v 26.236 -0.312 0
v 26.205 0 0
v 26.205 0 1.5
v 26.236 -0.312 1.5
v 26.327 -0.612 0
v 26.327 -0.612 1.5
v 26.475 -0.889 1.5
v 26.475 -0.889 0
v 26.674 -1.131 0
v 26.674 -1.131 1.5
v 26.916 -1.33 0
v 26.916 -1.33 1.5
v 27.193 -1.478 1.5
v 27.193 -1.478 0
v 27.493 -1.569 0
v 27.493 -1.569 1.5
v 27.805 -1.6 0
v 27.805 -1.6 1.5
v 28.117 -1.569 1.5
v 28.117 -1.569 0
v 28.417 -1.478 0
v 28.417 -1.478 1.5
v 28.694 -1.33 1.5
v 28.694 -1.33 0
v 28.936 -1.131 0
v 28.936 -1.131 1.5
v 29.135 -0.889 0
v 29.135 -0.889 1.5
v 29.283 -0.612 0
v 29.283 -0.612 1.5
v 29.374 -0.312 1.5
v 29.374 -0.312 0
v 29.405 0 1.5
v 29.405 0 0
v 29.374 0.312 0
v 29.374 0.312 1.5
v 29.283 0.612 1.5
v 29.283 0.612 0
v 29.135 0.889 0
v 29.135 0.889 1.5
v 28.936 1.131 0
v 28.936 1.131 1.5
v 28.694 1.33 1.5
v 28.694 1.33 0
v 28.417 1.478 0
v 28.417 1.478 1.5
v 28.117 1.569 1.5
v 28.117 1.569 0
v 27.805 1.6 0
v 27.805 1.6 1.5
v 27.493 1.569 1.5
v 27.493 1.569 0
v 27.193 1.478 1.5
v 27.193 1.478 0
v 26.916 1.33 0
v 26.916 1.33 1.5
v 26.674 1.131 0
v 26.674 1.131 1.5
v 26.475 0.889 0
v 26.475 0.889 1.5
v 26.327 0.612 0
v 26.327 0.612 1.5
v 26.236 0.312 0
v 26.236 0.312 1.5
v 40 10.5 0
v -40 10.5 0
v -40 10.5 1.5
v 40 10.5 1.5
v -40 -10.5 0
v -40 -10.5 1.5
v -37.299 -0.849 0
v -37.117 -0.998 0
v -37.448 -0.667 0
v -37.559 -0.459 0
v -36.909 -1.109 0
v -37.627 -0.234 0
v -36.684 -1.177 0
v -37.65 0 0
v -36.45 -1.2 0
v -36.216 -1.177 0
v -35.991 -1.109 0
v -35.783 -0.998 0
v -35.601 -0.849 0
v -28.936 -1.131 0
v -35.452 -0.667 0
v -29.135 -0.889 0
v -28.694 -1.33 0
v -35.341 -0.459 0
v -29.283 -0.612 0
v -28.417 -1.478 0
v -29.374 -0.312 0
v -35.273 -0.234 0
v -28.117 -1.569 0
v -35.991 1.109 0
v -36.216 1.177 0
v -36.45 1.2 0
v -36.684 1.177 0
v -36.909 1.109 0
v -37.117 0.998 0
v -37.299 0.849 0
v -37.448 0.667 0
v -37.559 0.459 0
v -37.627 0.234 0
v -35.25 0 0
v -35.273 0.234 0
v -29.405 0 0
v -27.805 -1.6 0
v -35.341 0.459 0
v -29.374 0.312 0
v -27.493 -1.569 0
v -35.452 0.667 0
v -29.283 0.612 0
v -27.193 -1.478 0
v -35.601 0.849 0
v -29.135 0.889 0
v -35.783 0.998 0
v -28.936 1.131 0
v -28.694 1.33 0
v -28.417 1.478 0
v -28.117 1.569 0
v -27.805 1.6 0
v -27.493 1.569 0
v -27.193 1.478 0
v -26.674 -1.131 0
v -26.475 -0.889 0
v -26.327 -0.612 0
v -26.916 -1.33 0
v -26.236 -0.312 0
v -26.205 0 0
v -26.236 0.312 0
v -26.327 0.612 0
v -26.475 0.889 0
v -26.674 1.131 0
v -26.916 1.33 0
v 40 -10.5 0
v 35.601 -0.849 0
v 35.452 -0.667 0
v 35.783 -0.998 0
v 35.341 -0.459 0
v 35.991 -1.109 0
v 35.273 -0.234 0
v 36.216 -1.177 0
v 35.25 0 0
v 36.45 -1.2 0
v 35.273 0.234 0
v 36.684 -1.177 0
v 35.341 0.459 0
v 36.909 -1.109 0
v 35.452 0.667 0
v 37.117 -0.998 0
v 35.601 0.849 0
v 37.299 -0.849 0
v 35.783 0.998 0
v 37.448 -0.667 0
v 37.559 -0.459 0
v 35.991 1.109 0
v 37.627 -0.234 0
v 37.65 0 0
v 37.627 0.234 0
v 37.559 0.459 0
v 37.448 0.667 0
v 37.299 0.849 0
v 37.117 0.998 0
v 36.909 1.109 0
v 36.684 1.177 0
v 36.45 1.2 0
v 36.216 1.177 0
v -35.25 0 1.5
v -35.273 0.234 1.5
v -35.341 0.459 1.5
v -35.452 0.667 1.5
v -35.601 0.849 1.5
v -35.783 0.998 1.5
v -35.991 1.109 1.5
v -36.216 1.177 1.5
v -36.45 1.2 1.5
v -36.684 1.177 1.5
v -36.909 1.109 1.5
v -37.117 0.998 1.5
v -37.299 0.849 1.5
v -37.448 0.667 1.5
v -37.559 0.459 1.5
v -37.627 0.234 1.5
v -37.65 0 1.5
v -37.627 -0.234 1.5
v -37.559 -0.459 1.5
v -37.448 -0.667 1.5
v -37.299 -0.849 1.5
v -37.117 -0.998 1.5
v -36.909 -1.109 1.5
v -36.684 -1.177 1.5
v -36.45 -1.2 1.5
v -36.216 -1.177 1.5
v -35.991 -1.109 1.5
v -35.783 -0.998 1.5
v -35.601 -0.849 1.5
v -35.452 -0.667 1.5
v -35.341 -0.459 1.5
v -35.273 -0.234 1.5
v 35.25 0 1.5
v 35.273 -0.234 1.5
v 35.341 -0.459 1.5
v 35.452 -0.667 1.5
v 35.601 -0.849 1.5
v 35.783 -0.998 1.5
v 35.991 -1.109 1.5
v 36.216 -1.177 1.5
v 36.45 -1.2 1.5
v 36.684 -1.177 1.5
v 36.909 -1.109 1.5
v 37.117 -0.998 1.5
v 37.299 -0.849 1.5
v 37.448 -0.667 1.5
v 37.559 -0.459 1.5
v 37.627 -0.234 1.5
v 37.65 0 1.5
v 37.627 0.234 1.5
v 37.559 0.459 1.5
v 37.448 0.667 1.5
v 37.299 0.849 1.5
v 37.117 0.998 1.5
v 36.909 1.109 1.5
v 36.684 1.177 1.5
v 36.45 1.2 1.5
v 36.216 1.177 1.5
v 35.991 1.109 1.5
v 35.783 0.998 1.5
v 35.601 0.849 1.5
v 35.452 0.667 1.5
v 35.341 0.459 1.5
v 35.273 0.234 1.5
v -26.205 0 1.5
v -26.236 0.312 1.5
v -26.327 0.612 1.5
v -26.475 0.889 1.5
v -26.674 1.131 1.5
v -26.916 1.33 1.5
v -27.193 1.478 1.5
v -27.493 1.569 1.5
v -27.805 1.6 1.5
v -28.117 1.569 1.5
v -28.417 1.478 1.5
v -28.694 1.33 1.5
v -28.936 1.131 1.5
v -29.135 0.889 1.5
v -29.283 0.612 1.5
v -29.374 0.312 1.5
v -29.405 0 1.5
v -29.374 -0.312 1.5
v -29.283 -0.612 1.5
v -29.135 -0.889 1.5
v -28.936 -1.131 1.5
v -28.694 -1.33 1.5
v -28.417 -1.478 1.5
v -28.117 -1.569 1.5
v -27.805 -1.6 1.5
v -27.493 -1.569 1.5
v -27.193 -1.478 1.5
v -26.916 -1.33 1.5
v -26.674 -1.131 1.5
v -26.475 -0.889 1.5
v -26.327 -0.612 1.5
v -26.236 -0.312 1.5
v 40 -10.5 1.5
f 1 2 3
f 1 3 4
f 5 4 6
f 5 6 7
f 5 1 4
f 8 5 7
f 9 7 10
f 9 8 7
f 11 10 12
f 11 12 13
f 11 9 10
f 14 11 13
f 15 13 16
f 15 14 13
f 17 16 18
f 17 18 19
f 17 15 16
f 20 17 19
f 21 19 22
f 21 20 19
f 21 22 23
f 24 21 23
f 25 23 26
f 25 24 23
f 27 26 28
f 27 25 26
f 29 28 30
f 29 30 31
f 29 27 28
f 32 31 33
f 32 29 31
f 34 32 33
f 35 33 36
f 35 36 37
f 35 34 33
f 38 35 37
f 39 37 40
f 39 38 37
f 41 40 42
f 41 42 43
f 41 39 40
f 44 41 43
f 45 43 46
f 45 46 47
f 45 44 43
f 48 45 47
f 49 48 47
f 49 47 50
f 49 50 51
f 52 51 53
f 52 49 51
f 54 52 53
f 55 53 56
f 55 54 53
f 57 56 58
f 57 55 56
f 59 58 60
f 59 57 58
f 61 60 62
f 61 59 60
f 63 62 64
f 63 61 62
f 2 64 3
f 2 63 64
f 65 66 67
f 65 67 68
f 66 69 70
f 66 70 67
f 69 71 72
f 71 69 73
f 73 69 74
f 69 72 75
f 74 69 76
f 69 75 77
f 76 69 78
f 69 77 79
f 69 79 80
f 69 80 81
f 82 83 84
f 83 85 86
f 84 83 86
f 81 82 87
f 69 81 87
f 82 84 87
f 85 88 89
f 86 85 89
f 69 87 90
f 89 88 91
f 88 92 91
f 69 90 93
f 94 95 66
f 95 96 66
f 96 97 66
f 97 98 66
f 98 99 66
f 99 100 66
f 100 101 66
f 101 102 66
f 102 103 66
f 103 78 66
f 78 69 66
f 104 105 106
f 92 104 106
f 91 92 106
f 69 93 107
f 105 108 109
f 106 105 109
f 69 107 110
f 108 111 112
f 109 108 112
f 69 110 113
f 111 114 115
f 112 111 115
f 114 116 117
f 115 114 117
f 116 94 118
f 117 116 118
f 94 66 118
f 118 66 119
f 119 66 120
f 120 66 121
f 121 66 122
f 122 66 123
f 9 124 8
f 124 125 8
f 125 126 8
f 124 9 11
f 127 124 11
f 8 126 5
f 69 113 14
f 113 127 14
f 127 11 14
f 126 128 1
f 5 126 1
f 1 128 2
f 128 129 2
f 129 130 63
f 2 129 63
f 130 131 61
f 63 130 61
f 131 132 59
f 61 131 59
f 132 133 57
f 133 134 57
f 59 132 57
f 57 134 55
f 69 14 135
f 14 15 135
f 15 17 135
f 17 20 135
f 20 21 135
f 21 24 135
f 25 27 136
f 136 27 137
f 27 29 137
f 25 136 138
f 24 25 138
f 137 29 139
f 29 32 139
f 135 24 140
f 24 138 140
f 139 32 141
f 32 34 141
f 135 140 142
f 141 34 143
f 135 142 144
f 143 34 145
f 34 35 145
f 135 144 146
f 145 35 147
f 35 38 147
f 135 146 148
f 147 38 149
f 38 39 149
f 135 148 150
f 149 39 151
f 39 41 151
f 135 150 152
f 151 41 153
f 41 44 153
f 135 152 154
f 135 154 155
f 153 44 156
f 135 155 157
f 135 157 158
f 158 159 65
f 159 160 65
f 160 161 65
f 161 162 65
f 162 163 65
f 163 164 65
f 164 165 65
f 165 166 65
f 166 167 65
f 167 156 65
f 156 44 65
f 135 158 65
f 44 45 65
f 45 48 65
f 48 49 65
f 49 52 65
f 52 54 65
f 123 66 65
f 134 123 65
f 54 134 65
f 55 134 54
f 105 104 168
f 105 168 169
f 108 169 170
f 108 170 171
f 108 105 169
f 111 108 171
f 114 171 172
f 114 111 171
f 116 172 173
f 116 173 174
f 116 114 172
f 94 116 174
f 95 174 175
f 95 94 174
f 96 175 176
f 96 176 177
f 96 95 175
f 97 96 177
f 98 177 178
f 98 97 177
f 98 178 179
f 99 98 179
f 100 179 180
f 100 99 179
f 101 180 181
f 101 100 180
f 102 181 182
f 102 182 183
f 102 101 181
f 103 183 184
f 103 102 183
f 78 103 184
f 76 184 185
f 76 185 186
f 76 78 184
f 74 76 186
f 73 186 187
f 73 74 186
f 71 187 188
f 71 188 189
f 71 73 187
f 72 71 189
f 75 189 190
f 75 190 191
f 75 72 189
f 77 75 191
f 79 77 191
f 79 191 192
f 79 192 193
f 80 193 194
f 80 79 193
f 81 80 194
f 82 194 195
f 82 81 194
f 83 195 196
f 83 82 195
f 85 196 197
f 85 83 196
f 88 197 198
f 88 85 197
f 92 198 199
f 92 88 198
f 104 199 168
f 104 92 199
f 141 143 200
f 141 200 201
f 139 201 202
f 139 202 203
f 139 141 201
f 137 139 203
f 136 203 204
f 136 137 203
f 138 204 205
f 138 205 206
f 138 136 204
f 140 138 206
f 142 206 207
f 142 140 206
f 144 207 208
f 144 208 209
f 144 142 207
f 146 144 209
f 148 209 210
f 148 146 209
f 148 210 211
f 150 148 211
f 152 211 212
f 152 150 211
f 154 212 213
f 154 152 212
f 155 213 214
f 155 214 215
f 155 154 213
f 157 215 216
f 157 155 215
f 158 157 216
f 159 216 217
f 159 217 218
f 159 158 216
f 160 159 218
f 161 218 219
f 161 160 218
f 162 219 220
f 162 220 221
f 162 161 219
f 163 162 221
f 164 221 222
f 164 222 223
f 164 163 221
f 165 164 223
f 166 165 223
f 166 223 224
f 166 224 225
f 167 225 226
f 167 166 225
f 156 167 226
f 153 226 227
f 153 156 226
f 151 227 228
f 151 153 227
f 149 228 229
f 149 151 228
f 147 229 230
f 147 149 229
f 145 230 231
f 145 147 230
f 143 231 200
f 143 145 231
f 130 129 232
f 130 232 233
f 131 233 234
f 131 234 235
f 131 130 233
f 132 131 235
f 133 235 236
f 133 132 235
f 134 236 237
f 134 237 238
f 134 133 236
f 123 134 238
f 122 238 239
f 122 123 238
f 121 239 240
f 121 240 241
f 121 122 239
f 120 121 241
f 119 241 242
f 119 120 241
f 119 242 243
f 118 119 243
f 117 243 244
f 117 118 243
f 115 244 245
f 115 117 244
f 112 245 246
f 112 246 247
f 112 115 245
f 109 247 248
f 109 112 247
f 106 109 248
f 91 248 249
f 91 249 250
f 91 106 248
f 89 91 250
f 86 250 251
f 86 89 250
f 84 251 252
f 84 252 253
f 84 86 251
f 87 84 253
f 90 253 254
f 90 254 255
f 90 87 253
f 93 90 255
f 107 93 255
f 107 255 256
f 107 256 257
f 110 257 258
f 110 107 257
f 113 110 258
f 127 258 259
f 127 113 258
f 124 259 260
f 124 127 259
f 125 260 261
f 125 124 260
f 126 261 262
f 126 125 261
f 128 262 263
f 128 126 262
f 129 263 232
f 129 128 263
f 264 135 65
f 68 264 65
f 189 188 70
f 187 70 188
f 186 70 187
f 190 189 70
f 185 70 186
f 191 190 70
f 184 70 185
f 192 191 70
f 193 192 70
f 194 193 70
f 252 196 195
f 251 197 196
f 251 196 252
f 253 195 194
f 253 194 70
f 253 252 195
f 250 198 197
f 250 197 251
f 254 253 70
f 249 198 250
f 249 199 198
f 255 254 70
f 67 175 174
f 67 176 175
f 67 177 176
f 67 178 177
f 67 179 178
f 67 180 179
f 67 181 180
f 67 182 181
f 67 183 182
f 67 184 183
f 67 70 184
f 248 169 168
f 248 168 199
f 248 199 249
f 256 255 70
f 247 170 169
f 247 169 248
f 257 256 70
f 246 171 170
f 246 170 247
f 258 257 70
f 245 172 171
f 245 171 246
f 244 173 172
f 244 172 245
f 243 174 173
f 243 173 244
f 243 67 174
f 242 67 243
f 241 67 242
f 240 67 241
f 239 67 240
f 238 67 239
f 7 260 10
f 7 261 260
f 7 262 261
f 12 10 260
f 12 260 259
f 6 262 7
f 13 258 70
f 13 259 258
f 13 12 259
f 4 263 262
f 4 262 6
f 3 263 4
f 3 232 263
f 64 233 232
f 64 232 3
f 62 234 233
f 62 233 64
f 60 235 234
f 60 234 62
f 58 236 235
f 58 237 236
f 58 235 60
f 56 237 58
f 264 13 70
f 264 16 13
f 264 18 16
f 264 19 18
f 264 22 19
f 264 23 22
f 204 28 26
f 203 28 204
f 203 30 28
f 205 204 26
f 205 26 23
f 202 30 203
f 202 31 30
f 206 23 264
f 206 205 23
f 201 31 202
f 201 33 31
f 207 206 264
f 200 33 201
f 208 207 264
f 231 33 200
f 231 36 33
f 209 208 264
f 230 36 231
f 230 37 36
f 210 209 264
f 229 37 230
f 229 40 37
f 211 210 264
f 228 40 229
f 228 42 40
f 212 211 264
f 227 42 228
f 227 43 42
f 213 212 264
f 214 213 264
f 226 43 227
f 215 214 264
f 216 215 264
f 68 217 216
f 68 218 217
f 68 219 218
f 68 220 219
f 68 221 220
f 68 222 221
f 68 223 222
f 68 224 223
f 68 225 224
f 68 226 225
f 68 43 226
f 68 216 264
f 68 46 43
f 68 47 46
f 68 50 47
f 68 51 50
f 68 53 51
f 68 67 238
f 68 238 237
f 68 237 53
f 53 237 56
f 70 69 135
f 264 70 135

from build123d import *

# Parameters (mm, degrees)
SKETCH1_W           = 80
SKETCH1_H           = 21
SKETCH1_R           = 1.2
SKETCH1_R_2         = 1.6
BOSS_EXTRUDE1_DEPTH = 1.5


with BuildPart() as part:
    # Sketch1 → Boss-Extrude1 (new body)
    with BuildSketch(Plane.XY):
        Rectangle(SKETCH1_W, SKETCH1_H)
        with Locations((-36.45, 0)):
            Circle(SKETCH1_R, mode=Mode.SUBTRACT)
        with Locations((-27.805, 0)):
            Circle(SKETCH1_R_2, mode=Mode.SUBTRACT)
        with Locations(Location((27.805, 0, 0), (0, 0, 180))):
            Circle(SKETCH1_R_2, mode=Mode.SUBTRACT)
        with Locations(Location((36.45, 0, 0), (0, 0, 180))):
            Circle(SKETCH1_R, mode=Mode.SUBTRACT)
    extrude(amount=BOSS_EXTRUDE1_DEPTH)


solid = part.part
